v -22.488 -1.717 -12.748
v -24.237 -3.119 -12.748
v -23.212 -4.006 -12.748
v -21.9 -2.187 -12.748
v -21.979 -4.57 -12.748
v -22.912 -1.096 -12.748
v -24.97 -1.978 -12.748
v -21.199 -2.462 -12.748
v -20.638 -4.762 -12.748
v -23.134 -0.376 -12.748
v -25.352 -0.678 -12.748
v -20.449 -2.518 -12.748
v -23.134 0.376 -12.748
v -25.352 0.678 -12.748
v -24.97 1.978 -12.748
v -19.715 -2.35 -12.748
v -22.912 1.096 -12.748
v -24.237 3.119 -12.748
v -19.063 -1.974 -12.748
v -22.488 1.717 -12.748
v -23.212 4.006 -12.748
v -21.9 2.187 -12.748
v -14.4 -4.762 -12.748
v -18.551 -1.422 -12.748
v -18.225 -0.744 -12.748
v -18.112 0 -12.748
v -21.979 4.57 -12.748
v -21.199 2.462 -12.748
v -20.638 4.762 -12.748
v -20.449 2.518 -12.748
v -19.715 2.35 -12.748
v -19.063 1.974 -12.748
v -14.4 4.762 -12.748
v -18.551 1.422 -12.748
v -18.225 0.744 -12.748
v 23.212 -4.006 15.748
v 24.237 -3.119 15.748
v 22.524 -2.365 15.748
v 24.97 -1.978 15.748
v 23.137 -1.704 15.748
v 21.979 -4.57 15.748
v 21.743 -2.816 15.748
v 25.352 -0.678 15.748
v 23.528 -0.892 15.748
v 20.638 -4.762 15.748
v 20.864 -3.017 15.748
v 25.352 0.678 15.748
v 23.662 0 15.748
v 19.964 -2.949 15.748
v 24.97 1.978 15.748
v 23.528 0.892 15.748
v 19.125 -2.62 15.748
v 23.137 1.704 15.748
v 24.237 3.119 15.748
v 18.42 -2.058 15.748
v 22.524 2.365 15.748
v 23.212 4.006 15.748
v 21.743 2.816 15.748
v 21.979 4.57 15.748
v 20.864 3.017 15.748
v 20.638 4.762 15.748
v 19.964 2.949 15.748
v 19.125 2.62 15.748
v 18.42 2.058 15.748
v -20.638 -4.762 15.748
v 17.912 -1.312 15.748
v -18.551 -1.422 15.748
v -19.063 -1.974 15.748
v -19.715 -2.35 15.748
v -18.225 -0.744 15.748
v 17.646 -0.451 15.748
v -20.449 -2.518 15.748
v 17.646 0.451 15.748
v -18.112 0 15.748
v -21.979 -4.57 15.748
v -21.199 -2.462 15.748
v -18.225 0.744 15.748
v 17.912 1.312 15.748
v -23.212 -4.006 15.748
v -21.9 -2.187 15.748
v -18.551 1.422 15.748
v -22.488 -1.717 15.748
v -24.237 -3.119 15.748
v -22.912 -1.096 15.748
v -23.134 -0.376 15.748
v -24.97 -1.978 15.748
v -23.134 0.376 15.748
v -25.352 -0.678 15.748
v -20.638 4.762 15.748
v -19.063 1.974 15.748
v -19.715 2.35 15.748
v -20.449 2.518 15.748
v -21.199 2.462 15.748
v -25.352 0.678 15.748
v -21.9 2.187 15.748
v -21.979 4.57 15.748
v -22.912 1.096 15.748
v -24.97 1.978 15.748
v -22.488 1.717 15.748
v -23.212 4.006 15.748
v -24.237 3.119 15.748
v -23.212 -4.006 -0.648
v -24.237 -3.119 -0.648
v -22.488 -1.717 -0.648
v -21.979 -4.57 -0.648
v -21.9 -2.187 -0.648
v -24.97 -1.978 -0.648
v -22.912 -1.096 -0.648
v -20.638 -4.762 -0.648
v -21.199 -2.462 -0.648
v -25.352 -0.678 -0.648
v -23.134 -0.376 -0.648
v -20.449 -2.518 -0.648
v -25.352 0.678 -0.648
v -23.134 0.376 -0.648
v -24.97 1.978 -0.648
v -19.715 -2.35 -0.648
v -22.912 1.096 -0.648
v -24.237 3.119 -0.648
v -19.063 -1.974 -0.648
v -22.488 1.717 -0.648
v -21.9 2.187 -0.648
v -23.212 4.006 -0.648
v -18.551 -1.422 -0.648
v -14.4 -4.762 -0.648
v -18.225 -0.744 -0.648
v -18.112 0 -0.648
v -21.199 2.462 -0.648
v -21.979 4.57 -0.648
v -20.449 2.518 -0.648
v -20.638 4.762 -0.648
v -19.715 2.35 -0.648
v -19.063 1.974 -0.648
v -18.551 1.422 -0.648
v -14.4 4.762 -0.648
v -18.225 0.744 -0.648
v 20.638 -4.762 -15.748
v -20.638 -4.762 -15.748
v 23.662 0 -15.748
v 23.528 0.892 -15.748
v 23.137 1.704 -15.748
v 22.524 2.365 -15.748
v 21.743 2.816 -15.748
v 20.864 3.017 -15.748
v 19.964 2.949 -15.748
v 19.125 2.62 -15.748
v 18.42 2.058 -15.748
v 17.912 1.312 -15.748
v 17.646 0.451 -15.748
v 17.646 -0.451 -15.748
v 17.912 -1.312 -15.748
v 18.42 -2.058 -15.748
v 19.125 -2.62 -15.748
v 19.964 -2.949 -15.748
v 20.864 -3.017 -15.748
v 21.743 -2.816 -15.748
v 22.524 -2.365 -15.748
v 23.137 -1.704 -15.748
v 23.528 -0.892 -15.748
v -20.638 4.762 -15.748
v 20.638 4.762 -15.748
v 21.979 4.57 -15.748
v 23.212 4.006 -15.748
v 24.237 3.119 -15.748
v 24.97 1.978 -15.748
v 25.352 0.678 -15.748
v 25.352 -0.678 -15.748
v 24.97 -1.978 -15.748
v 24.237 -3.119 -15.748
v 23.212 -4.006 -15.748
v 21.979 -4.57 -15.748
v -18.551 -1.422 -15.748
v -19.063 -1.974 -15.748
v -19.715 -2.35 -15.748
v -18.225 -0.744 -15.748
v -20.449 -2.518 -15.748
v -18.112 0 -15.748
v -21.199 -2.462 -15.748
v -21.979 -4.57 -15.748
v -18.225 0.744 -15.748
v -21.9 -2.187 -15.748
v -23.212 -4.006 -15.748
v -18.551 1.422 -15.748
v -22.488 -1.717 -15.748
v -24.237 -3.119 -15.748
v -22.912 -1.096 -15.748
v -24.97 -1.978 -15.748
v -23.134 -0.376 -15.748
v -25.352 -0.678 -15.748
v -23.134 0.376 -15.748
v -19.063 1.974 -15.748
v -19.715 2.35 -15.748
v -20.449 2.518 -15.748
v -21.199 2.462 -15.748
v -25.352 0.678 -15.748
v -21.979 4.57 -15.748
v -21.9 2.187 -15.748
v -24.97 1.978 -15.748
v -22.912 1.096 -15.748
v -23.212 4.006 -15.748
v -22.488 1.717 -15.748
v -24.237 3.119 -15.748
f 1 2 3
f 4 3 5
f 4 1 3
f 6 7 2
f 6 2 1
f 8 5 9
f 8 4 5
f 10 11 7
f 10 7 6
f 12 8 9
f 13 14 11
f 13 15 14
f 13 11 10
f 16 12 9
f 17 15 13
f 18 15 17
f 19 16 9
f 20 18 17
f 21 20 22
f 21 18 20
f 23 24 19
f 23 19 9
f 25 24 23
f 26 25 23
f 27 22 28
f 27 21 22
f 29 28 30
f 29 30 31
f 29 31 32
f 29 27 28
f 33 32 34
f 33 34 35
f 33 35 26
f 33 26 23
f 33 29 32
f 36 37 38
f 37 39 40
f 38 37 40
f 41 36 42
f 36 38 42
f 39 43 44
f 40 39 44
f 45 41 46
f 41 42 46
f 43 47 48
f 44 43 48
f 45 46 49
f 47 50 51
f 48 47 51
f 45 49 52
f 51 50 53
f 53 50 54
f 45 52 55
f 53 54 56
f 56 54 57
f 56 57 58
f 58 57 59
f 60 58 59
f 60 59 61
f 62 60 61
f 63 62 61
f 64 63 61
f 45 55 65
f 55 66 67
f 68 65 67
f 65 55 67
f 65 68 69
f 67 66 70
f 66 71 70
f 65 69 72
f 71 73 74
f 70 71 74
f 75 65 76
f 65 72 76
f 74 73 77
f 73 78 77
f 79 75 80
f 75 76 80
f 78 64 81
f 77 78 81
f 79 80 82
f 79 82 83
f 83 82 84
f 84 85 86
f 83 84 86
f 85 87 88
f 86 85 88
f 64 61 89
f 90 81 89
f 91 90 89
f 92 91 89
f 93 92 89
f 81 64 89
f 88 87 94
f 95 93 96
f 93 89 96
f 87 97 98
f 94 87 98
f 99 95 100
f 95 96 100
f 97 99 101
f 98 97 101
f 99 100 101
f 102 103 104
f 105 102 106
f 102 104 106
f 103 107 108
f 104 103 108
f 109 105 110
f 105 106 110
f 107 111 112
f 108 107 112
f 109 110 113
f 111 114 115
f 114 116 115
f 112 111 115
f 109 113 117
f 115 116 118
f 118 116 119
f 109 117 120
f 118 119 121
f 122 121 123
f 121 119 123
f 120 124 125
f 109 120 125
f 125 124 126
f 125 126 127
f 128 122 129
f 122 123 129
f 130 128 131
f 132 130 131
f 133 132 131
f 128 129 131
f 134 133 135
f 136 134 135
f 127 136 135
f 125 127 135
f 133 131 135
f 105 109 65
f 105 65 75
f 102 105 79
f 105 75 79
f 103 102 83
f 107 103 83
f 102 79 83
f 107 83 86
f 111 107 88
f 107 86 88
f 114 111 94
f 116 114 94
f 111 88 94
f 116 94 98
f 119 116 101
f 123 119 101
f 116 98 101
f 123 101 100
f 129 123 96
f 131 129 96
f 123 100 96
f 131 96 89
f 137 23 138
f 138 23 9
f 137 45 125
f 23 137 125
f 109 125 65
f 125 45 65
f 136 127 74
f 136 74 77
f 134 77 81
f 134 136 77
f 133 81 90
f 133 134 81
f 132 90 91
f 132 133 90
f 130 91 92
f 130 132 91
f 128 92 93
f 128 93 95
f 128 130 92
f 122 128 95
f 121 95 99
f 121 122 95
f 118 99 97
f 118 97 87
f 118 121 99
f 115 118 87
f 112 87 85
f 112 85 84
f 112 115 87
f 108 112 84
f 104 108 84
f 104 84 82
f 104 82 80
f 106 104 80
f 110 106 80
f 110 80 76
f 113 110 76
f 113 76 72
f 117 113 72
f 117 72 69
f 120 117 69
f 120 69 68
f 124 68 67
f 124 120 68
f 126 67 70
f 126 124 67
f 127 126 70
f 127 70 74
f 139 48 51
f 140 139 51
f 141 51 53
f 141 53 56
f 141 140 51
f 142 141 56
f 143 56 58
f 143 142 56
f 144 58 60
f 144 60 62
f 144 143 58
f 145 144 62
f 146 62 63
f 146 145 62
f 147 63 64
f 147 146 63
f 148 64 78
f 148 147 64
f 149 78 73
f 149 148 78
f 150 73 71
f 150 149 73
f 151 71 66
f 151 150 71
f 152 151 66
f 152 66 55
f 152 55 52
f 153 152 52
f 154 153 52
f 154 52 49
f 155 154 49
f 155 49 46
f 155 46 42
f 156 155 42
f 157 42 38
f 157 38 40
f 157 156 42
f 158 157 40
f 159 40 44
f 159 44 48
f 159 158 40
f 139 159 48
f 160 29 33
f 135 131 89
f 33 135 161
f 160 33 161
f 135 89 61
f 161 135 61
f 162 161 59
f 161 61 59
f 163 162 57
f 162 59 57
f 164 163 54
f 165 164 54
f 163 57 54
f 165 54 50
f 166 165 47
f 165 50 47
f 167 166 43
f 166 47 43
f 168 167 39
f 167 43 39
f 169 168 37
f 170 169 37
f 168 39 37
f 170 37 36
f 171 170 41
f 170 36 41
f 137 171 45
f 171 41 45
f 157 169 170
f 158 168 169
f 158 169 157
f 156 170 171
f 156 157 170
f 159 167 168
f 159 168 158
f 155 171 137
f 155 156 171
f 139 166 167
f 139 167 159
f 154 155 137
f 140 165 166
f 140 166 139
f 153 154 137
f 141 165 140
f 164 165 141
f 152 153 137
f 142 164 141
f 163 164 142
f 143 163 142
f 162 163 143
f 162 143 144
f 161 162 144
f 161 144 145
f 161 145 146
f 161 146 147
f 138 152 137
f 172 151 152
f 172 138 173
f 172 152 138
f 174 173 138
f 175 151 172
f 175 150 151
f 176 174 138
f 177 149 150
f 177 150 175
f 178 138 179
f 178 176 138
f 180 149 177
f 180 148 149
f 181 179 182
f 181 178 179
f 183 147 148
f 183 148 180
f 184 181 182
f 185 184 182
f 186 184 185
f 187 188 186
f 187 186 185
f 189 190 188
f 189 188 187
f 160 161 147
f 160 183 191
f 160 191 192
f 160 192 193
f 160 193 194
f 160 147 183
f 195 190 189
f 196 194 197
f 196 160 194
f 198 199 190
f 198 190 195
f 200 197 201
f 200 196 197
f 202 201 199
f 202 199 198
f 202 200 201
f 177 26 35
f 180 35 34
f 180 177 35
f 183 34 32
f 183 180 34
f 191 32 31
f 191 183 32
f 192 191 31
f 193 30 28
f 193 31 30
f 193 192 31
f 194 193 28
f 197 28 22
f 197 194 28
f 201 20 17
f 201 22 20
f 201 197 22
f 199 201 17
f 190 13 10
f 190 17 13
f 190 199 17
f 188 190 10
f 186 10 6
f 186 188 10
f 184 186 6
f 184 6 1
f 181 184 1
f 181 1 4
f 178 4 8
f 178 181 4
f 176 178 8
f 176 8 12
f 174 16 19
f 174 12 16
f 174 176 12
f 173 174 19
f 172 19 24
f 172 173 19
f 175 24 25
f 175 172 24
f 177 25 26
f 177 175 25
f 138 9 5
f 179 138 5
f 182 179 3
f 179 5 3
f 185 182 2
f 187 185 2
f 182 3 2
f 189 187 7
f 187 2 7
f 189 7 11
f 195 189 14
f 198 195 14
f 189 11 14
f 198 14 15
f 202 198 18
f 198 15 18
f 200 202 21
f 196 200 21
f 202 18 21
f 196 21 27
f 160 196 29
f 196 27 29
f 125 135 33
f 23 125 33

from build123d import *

# Parameters (mm, degrees)
SKETCH5_R           = 2.525
SKETCH5_R_2         = 3.025
BOSS_EXTRUDE2_DEPTH = 15.748
SKETCH6_W           = 11
SKETCH6_H           = 12.1
CUT_EXTRUDE2_DEPTH  = 12.7


with BuildPart() as part:
    # Sketch5 → Boss-Extrude2 (new body, symmetric)
    with BuildSketch(Plane.XY):
        with BuildLine():
            Line((-20.6375, 4.7625), (20.6375, 4.7625))
            ThreePointArc((20.6375, 4.7625), (25.4, 0), (20.6375, -4.7625))
            Line((20.6375, -4.7625), (-20.6375, -4.7625))
            ThreePointArc((-20.6375, -4.7625), (-25.4, 0), (-20.6375, 4.7625))
        make_face()
        with Locations((-20.6375, 0)):
            Circle(SKETCH5_R, mode=Mode.SUBTRACT)
        with Locations((20.6375, 0)):
            Circle(SKETCH5_R_2, mode=Mode.SUBTRACT)
    extrude(amount=BOSS_EXTRUDE2_DEPTH, both=True)

    # Sketch6 → Cut-Extrude2 (cut, symmetric)
    with BuildSketch(Plane(origin=(0, 0, 0), x_dir=(1, 0, 0), z_dir=(0, 1, 0))):
        with Locations((-19.9, 6.698)):
            Rectangle(SKETCH6_W, SKETCH6_H)
    extrude(amount=CUT_EXTRUDE2_DEPTH, both=True, mode=Mode.SUBTRACT)


solid = part.part
